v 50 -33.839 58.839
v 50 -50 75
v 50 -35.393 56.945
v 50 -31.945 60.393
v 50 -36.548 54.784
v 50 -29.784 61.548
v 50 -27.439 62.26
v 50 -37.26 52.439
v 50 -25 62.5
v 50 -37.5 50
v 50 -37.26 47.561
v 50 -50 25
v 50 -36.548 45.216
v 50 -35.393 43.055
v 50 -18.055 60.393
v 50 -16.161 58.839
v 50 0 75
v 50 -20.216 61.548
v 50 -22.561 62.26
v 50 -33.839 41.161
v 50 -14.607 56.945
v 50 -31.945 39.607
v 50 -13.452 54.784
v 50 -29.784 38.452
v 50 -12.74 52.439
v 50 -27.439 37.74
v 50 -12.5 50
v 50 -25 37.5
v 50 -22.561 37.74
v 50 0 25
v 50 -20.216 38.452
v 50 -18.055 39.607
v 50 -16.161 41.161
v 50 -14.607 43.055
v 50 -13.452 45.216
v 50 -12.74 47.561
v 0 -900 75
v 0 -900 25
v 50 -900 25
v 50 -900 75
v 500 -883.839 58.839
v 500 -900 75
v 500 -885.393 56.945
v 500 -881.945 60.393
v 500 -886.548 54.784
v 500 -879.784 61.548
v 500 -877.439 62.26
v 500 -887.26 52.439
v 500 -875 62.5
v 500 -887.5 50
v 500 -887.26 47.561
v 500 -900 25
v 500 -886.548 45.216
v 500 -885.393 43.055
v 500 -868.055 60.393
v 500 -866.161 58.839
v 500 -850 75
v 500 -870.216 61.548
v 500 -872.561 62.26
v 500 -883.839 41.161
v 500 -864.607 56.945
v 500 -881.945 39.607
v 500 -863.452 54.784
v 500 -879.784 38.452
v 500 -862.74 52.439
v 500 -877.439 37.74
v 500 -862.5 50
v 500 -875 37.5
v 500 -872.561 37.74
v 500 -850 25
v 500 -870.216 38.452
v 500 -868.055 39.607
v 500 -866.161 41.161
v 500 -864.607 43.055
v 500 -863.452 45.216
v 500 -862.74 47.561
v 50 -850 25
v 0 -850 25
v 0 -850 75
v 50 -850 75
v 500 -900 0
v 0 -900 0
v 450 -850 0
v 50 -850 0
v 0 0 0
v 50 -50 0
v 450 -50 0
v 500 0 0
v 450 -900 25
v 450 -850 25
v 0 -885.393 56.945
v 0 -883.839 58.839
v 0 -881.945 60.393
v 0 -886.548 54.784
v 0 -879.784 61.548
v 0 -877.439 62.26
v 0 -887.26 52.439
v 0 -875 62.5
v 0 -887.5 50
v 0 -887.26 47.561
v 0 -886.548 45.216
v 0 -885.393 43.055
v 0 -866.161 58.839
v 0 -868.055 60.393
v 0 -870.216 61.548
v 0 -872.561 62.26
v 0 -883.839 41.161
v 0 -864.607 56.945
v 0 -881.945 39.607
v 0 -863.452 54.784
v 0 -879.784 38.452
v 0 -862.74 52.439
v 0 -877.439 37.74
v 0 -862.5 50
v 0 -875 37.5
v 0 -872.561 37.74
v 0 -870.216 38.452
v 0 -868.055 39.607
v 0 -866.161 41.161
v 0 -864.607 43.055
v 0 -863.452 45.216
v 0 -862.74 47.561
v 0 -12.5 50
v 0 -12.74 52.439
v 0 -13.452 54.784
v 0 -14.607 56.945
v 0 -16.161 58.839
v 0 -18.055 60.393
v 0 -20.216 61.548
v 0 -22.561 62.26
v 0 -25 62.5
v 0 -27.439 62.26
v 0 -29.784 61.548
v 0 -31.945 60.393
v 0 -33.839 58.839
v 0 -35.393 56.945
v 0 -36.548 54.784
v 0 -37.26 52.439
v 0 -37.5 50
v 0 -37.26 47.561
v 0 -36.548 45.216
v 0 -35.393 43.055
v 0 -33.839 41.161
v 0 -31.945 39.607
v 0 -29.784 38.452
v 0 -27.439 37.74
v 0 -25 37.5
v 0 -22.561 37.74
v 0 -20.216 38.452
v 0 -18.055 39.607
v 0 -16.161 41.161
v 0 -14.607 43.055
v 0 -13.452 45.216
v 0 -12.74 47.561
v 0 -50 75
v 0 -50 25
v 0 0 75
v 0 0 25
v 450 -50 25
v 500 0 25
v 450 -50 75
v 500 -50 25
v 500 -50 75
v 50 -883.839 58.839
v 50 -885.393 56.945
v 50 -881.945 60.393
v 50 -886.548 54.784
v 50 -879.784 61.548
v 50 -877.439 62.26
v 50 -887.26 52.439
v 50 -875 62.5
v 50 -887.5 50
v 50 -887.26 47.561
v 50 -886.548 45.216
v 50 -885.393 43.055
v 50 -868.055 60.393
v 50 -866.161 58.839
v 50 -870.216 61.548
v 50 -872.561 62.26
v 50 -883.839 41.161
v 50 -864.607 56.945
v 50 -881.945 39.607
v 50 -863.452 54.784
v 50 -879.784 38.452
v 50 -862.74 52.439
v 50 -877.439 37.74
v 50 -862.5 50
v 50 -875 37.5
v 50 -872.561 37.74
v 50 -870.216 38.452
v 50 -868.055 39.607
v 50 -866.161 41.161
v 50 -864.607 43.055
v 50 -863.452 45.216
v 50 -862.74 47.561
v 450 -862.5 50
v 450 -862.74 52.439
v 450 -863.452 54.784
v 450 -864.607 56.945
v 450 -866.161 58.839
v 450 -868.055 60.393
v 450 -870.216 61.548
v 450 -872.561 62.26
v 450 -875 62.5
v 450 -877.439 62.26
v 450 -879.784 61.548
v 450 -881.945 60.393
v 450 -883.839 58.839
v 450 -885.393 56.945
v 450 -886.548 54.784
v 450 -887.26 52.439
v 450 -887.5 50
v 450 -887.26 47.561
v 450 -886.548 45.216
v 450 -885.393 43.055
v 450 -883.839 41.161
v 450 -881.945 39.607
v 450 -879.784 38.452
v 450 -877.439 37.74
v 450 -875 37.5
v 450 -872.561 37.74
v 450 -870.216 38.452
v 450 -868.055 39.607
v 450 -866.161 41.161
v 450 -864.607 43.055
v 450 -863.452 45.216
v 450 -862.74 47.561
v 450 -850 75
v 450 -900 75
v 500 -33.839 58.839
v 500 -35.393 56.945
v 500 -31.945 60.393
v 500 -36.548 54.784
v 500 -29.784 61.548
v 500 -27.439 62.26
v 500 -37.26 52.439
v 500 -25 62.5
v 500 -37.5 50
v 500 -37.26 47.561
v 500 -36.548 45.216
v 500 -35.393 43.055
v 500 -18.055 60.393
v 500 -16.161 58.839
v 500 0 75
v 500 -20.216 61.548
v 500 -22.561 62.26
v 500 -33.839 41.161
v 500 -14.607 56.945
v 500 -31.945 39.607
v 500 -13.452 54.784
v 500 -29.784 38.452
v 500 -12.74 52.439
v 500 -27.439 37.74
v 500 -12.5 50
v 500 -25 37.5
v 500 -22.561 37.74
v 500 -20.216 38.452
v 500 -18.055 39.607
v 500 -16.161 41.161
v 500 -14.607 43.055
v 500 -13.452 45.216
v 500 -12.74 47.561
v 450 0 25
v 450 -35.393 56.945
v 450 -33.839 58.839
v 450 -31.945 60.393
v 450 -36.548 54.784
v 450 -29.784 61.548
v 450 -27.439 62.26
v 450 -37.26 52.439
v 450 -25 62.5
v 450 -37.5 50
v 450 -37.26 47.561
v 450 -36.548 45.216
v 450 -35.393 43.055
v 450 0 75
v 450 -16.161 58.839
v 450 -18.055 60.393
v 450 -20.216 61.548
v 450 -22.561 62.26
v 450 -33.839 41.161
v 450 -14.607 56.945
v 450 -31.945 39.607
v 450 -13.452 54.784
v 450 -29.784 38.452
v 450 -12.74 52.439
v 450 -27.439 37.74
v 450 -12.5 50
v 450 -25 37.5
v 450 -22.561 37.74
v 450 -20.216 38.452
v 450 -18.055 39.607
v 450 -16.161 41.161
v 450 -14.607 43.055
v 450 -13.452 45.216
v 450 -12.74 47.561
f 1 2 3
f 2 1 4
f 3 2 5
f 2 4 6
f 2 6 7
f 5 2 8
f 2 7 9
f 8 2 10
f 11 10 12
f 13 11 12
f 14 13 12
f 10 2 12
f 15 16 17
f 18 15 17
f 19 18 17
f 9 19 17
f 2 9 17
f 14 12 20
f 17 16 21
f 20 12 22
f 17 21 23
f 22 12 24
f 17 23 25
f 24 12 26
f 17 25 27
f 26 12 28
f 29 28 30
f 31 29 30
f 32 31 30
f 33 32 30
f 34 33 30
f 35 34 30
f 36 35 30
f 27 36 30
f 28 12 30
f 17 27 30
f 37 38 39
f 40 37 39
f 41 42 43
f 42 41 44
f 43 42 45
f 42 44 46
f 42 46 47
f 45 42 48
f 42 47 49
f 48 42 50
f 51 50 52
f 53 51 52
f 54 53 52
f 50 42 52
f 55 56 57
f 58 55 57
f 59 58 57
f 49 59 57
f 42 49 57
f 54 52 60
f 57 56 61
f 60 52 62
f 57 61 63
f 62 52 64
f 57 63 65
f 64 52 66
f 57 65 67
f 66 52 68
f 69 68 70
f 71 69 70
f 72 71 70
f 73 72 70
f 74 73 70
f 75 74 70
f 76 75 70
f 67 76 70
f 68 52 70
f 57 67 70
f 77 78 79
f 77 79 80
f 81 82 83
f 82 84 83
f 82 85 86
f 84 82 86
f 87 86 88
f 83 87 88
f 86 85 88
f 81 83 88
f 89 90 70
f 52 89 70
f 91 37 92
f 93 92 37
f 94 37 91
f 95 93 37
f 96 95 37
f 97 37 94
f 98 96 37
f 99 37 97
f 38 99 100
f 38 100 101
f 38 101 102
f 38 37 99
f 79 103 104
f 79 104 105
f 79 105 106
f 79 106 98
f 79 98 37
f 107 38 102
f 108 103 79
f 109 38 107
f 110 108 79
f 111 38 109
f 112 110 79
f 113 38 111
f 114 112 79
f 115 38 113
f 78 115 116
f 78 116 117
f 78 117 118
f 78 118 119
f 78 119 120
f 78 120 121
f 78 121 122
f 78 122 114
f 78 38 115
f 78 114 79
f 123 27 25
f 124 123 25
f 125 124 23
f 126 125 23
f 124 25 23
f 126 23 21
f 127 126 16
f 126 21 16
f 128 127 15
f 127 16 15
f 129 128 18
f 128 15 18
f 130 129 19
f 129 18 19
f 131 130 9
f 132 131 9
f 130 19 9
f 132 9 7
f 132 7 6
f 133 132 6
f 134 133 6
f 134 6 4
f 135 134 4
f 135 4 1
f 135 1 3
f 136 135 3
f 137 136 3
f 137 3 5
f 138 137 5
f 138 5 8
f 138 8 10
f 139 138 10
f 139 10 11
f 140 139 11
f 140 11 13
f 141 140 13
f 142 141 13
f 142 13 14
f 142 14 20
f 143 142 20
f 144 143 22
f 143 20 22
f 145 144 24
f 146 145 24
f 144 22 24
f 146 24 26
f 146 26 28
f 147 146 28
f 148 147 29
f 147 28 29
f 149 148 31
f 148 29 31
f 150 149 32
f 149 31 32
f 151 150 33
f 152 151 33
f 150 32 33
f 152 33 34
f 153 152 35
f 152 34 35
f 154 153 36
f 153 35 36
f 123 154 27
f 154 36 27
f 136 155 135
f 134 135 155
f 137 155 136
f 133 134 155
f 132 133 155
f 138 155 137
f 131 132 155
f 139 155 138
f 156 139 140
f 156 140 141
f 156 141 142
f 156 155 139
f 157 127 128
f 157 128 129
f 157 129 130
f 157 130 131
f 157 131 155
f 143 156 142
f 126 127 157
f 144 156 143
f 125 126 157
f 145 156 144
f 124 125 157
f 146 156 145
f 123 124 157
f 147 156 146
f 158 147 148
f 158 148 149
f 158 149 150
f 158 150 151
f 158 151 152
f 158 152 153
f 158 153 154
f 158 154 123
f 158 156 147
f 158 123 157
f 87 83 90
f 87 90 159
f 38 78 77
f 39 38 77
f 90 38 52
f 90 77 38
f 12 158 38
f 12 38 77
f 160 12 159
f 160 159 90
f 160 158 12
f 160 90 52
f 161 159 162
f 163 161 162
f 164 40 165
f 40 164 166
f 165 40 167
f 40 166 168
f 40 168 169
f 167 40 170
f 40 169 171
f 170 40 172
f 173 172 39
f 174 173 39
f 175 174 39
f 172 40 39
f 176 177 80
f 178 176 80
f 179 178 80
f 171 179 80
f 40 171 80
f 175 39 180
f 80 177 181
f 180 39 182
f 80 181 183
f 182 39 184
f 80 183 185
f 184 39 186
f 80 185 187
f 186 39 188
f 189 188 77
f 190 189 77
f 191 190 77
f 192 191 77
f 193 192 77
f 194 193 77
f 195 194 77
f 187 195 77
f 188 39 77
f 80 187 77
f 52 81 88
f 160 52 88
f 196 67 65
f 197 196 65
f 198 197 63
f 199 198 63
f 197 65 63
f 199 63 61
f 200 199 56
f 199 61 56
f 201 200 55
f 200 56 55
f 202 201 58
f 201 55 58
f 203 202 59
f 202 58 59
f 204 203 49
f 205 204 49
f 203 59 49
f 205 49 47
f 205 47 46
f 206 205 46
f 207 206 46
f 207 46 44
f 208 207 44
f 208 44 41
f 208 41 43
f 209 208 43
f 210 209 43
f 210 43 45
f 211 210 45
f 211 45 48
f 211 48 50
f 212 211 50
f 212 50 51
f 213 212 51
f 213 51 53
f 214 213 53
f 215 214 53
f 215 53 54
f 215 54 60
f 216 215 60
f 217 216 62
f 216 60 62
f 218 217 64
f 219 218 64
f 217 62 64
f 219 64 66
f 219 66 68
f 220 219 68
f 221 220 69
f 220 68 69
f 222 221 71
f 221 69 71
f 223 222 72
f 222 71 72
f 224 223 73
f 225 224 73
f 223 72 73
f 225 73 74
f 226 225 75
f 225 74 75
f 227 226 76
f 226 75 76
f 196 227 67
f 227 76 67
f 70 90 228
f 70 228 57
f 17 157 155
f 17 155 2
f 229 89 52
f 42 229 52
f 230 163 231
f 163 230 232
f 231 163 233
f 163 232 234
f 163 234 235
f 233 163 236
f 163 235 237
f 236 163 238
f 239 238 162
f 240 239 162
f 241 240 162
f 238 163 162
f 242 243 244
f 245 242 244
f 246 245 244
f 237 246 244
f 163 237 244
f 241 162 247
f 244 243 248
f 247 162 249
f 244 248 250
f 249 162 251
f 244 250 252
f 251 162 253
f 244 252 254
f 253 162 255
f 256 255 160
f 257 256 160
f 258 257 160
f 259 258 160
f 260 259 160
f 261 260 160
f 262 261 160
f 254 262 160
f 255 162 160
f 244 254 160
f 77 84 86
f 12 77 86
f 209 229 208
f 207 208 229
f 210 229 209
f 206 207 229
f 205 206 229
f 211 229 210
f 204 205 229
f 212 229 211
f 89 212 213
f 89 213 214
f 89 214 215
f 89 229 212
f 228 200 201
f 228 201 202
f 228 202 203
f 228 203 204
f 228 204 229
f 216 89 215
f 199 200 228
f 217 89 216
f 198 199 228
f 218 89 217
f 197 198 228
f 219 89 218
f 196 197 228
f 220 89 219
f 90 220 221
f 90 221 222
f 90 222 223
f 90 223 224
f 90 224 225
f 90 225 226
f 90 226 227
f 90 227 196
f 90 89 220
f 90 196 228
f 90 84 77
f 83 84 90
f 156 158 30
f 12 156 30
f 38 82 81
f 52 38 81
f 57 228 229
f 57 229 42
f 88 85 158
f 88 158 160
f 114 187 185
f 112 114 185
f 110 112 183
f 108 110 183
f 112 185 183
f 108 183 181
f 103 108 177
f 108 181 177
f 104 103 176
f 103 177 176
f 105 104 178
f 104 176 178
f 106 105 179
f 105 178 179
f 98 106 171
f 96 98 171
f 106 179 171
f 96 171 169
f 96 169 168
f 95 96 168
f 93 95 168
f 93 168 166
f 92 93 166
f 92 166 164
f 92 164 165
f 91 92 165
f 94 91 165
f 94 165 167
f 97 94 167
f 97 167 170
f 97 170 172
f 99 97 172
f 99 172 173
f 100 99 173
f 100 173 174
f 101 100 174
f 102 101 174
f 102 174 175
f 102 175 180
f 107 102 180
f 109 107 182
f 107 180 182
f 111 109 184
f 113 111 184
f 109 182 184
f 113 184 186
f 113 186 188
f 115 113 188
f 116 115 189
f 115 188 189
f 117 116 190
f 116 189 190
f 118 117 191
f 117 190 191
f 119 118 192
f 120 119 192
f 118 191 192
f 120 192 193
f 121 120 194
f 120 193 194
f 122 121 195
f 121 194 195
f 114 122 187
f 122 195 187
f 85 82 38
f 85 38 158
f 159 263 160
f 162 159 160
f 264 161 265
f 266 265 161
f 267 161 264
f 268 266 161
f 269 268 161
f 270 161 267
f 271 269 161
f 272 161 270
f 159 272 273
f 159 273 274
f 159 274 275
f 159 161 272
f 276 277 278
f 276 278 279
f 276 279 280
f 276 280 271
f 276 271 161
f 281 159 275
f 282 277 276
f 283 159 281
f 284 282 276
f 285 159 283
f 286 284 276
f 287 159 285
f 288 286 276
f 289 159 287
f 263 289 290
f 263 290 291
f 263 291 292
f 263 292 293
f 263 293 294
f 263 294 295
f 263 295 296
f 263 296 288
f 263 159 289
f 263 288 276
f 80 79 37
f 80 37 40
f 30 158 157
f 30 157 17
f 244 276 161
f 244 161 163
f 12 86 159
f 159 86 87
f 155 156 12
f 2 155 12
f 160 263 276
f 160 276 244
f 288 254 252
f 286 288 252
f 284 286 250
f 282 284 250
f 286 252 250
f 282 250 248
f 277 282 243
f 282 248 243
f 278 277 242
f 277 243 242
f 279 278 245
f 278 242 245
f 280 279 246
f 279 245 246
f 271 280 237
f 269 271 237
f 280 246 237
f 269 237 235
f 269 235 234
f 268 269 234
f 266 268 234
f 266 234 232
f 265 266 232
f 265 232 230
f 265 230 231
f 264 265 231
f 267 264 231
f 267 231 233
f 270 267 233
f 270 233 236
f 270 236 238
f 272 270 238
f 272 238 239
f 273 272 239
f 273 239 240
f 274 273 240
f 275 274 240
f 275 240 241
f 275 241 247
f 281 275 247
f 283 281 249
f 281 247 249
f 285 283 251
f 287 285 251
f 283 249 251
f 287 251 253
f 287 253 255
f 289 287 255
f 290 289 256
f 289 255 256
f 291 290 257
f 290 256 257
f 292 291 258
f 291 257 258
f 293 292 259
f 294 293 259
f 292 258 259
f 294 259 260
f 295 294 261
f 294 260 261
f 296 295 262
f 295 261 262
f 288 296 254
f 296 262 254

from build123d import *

# Parameters (mm, degrees)
F0_W     = 500
F0_H     = 900
F0_W_2   = 400
F0_H_2   = 800
F1_DEPTH = 25
F2_W     = 50
F2_H     = 50
F3_DEPTH = 50
F4_R     = 12.5
F5_DEPTH = 500.001
F6_R     = 12.5
F7_DEPTH = 500.001


with BuildPart() as f1:
    # F0 (on Top) → F1 (new body)
    with BuildSketch(Plane.XY):
        with Locations((250, -450)):
            Rectangle(F0_W, F0_H)
        with Locations((250, -450)):
            Rectangle(F0_W_2, F0_H_2, mode=Mode.SUBTRACT)
    extrude(amount=F1_DEPTH)


with BuildPart() as f3:
    # F2 (on face) → F3 (new body)
    with BuildSketch(Plane.XY.offset(25)):
        with Locations((25, -875)):
            Rectangle(F2_W, F2_H)
        with Locations((25, -25)):
            Rectangle(F2_W, F2_H)
        with Locations((475, -25)):
            Rectangle(F2_W, F2_H)
        with Locations((475, -875)):
            Rectangle(F2_W, F2_H)
    extrude(amount=F3_DEPTH)

    # F4 (on face) → F5 (cut, through all)
    with BuildSketch(Plane.YZ.offset(500)):
        with Locations((-875, 50)):
            Circle(F4_R)
    extrude(amount=-F5_DEPTH, mode=Mode.SUBTRACT)

    # F6 (on face) → F7 (cut, through all)
    with BuildSketch(Plane.YZ.offset(500)):
        with Locations((-25, 50)):
            Circle(F6_R)
    extrude(amount=-F7_DEPTH, mode=Mode.SUBTRACT)


solid = Compound([f1.part, f3.part])
